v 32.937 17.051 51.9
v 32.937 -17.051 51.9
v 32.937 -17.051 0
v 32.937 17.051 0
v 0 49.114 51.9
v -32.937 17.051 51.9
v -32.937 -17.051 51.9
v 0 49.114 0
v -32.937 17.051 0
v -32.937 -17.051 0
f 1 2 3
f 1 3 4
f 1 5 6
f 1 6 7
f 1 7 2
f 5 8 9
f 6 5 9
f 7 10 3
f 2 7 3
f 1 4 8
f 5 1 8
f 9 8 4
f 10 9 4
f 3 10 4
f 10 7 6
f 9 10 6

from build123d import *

# Parameters (mm, degrees)
F0_W     = 65.873436
F0_H     = 34.102622
F1_DEPTH = 51.9


with BuildPart() as f1:
    # F0 (on Top) → F1 (new body)
    with BuildSketch(Plane.XY):
        Polygon((-32.936718, 17.051311), (32.936718, 17.051311), (0, 49.113605), align=None)
        Rectangle(F0_W, F0_H)
    extrude(amount=F1_DEPTH)


solid = f1.part
